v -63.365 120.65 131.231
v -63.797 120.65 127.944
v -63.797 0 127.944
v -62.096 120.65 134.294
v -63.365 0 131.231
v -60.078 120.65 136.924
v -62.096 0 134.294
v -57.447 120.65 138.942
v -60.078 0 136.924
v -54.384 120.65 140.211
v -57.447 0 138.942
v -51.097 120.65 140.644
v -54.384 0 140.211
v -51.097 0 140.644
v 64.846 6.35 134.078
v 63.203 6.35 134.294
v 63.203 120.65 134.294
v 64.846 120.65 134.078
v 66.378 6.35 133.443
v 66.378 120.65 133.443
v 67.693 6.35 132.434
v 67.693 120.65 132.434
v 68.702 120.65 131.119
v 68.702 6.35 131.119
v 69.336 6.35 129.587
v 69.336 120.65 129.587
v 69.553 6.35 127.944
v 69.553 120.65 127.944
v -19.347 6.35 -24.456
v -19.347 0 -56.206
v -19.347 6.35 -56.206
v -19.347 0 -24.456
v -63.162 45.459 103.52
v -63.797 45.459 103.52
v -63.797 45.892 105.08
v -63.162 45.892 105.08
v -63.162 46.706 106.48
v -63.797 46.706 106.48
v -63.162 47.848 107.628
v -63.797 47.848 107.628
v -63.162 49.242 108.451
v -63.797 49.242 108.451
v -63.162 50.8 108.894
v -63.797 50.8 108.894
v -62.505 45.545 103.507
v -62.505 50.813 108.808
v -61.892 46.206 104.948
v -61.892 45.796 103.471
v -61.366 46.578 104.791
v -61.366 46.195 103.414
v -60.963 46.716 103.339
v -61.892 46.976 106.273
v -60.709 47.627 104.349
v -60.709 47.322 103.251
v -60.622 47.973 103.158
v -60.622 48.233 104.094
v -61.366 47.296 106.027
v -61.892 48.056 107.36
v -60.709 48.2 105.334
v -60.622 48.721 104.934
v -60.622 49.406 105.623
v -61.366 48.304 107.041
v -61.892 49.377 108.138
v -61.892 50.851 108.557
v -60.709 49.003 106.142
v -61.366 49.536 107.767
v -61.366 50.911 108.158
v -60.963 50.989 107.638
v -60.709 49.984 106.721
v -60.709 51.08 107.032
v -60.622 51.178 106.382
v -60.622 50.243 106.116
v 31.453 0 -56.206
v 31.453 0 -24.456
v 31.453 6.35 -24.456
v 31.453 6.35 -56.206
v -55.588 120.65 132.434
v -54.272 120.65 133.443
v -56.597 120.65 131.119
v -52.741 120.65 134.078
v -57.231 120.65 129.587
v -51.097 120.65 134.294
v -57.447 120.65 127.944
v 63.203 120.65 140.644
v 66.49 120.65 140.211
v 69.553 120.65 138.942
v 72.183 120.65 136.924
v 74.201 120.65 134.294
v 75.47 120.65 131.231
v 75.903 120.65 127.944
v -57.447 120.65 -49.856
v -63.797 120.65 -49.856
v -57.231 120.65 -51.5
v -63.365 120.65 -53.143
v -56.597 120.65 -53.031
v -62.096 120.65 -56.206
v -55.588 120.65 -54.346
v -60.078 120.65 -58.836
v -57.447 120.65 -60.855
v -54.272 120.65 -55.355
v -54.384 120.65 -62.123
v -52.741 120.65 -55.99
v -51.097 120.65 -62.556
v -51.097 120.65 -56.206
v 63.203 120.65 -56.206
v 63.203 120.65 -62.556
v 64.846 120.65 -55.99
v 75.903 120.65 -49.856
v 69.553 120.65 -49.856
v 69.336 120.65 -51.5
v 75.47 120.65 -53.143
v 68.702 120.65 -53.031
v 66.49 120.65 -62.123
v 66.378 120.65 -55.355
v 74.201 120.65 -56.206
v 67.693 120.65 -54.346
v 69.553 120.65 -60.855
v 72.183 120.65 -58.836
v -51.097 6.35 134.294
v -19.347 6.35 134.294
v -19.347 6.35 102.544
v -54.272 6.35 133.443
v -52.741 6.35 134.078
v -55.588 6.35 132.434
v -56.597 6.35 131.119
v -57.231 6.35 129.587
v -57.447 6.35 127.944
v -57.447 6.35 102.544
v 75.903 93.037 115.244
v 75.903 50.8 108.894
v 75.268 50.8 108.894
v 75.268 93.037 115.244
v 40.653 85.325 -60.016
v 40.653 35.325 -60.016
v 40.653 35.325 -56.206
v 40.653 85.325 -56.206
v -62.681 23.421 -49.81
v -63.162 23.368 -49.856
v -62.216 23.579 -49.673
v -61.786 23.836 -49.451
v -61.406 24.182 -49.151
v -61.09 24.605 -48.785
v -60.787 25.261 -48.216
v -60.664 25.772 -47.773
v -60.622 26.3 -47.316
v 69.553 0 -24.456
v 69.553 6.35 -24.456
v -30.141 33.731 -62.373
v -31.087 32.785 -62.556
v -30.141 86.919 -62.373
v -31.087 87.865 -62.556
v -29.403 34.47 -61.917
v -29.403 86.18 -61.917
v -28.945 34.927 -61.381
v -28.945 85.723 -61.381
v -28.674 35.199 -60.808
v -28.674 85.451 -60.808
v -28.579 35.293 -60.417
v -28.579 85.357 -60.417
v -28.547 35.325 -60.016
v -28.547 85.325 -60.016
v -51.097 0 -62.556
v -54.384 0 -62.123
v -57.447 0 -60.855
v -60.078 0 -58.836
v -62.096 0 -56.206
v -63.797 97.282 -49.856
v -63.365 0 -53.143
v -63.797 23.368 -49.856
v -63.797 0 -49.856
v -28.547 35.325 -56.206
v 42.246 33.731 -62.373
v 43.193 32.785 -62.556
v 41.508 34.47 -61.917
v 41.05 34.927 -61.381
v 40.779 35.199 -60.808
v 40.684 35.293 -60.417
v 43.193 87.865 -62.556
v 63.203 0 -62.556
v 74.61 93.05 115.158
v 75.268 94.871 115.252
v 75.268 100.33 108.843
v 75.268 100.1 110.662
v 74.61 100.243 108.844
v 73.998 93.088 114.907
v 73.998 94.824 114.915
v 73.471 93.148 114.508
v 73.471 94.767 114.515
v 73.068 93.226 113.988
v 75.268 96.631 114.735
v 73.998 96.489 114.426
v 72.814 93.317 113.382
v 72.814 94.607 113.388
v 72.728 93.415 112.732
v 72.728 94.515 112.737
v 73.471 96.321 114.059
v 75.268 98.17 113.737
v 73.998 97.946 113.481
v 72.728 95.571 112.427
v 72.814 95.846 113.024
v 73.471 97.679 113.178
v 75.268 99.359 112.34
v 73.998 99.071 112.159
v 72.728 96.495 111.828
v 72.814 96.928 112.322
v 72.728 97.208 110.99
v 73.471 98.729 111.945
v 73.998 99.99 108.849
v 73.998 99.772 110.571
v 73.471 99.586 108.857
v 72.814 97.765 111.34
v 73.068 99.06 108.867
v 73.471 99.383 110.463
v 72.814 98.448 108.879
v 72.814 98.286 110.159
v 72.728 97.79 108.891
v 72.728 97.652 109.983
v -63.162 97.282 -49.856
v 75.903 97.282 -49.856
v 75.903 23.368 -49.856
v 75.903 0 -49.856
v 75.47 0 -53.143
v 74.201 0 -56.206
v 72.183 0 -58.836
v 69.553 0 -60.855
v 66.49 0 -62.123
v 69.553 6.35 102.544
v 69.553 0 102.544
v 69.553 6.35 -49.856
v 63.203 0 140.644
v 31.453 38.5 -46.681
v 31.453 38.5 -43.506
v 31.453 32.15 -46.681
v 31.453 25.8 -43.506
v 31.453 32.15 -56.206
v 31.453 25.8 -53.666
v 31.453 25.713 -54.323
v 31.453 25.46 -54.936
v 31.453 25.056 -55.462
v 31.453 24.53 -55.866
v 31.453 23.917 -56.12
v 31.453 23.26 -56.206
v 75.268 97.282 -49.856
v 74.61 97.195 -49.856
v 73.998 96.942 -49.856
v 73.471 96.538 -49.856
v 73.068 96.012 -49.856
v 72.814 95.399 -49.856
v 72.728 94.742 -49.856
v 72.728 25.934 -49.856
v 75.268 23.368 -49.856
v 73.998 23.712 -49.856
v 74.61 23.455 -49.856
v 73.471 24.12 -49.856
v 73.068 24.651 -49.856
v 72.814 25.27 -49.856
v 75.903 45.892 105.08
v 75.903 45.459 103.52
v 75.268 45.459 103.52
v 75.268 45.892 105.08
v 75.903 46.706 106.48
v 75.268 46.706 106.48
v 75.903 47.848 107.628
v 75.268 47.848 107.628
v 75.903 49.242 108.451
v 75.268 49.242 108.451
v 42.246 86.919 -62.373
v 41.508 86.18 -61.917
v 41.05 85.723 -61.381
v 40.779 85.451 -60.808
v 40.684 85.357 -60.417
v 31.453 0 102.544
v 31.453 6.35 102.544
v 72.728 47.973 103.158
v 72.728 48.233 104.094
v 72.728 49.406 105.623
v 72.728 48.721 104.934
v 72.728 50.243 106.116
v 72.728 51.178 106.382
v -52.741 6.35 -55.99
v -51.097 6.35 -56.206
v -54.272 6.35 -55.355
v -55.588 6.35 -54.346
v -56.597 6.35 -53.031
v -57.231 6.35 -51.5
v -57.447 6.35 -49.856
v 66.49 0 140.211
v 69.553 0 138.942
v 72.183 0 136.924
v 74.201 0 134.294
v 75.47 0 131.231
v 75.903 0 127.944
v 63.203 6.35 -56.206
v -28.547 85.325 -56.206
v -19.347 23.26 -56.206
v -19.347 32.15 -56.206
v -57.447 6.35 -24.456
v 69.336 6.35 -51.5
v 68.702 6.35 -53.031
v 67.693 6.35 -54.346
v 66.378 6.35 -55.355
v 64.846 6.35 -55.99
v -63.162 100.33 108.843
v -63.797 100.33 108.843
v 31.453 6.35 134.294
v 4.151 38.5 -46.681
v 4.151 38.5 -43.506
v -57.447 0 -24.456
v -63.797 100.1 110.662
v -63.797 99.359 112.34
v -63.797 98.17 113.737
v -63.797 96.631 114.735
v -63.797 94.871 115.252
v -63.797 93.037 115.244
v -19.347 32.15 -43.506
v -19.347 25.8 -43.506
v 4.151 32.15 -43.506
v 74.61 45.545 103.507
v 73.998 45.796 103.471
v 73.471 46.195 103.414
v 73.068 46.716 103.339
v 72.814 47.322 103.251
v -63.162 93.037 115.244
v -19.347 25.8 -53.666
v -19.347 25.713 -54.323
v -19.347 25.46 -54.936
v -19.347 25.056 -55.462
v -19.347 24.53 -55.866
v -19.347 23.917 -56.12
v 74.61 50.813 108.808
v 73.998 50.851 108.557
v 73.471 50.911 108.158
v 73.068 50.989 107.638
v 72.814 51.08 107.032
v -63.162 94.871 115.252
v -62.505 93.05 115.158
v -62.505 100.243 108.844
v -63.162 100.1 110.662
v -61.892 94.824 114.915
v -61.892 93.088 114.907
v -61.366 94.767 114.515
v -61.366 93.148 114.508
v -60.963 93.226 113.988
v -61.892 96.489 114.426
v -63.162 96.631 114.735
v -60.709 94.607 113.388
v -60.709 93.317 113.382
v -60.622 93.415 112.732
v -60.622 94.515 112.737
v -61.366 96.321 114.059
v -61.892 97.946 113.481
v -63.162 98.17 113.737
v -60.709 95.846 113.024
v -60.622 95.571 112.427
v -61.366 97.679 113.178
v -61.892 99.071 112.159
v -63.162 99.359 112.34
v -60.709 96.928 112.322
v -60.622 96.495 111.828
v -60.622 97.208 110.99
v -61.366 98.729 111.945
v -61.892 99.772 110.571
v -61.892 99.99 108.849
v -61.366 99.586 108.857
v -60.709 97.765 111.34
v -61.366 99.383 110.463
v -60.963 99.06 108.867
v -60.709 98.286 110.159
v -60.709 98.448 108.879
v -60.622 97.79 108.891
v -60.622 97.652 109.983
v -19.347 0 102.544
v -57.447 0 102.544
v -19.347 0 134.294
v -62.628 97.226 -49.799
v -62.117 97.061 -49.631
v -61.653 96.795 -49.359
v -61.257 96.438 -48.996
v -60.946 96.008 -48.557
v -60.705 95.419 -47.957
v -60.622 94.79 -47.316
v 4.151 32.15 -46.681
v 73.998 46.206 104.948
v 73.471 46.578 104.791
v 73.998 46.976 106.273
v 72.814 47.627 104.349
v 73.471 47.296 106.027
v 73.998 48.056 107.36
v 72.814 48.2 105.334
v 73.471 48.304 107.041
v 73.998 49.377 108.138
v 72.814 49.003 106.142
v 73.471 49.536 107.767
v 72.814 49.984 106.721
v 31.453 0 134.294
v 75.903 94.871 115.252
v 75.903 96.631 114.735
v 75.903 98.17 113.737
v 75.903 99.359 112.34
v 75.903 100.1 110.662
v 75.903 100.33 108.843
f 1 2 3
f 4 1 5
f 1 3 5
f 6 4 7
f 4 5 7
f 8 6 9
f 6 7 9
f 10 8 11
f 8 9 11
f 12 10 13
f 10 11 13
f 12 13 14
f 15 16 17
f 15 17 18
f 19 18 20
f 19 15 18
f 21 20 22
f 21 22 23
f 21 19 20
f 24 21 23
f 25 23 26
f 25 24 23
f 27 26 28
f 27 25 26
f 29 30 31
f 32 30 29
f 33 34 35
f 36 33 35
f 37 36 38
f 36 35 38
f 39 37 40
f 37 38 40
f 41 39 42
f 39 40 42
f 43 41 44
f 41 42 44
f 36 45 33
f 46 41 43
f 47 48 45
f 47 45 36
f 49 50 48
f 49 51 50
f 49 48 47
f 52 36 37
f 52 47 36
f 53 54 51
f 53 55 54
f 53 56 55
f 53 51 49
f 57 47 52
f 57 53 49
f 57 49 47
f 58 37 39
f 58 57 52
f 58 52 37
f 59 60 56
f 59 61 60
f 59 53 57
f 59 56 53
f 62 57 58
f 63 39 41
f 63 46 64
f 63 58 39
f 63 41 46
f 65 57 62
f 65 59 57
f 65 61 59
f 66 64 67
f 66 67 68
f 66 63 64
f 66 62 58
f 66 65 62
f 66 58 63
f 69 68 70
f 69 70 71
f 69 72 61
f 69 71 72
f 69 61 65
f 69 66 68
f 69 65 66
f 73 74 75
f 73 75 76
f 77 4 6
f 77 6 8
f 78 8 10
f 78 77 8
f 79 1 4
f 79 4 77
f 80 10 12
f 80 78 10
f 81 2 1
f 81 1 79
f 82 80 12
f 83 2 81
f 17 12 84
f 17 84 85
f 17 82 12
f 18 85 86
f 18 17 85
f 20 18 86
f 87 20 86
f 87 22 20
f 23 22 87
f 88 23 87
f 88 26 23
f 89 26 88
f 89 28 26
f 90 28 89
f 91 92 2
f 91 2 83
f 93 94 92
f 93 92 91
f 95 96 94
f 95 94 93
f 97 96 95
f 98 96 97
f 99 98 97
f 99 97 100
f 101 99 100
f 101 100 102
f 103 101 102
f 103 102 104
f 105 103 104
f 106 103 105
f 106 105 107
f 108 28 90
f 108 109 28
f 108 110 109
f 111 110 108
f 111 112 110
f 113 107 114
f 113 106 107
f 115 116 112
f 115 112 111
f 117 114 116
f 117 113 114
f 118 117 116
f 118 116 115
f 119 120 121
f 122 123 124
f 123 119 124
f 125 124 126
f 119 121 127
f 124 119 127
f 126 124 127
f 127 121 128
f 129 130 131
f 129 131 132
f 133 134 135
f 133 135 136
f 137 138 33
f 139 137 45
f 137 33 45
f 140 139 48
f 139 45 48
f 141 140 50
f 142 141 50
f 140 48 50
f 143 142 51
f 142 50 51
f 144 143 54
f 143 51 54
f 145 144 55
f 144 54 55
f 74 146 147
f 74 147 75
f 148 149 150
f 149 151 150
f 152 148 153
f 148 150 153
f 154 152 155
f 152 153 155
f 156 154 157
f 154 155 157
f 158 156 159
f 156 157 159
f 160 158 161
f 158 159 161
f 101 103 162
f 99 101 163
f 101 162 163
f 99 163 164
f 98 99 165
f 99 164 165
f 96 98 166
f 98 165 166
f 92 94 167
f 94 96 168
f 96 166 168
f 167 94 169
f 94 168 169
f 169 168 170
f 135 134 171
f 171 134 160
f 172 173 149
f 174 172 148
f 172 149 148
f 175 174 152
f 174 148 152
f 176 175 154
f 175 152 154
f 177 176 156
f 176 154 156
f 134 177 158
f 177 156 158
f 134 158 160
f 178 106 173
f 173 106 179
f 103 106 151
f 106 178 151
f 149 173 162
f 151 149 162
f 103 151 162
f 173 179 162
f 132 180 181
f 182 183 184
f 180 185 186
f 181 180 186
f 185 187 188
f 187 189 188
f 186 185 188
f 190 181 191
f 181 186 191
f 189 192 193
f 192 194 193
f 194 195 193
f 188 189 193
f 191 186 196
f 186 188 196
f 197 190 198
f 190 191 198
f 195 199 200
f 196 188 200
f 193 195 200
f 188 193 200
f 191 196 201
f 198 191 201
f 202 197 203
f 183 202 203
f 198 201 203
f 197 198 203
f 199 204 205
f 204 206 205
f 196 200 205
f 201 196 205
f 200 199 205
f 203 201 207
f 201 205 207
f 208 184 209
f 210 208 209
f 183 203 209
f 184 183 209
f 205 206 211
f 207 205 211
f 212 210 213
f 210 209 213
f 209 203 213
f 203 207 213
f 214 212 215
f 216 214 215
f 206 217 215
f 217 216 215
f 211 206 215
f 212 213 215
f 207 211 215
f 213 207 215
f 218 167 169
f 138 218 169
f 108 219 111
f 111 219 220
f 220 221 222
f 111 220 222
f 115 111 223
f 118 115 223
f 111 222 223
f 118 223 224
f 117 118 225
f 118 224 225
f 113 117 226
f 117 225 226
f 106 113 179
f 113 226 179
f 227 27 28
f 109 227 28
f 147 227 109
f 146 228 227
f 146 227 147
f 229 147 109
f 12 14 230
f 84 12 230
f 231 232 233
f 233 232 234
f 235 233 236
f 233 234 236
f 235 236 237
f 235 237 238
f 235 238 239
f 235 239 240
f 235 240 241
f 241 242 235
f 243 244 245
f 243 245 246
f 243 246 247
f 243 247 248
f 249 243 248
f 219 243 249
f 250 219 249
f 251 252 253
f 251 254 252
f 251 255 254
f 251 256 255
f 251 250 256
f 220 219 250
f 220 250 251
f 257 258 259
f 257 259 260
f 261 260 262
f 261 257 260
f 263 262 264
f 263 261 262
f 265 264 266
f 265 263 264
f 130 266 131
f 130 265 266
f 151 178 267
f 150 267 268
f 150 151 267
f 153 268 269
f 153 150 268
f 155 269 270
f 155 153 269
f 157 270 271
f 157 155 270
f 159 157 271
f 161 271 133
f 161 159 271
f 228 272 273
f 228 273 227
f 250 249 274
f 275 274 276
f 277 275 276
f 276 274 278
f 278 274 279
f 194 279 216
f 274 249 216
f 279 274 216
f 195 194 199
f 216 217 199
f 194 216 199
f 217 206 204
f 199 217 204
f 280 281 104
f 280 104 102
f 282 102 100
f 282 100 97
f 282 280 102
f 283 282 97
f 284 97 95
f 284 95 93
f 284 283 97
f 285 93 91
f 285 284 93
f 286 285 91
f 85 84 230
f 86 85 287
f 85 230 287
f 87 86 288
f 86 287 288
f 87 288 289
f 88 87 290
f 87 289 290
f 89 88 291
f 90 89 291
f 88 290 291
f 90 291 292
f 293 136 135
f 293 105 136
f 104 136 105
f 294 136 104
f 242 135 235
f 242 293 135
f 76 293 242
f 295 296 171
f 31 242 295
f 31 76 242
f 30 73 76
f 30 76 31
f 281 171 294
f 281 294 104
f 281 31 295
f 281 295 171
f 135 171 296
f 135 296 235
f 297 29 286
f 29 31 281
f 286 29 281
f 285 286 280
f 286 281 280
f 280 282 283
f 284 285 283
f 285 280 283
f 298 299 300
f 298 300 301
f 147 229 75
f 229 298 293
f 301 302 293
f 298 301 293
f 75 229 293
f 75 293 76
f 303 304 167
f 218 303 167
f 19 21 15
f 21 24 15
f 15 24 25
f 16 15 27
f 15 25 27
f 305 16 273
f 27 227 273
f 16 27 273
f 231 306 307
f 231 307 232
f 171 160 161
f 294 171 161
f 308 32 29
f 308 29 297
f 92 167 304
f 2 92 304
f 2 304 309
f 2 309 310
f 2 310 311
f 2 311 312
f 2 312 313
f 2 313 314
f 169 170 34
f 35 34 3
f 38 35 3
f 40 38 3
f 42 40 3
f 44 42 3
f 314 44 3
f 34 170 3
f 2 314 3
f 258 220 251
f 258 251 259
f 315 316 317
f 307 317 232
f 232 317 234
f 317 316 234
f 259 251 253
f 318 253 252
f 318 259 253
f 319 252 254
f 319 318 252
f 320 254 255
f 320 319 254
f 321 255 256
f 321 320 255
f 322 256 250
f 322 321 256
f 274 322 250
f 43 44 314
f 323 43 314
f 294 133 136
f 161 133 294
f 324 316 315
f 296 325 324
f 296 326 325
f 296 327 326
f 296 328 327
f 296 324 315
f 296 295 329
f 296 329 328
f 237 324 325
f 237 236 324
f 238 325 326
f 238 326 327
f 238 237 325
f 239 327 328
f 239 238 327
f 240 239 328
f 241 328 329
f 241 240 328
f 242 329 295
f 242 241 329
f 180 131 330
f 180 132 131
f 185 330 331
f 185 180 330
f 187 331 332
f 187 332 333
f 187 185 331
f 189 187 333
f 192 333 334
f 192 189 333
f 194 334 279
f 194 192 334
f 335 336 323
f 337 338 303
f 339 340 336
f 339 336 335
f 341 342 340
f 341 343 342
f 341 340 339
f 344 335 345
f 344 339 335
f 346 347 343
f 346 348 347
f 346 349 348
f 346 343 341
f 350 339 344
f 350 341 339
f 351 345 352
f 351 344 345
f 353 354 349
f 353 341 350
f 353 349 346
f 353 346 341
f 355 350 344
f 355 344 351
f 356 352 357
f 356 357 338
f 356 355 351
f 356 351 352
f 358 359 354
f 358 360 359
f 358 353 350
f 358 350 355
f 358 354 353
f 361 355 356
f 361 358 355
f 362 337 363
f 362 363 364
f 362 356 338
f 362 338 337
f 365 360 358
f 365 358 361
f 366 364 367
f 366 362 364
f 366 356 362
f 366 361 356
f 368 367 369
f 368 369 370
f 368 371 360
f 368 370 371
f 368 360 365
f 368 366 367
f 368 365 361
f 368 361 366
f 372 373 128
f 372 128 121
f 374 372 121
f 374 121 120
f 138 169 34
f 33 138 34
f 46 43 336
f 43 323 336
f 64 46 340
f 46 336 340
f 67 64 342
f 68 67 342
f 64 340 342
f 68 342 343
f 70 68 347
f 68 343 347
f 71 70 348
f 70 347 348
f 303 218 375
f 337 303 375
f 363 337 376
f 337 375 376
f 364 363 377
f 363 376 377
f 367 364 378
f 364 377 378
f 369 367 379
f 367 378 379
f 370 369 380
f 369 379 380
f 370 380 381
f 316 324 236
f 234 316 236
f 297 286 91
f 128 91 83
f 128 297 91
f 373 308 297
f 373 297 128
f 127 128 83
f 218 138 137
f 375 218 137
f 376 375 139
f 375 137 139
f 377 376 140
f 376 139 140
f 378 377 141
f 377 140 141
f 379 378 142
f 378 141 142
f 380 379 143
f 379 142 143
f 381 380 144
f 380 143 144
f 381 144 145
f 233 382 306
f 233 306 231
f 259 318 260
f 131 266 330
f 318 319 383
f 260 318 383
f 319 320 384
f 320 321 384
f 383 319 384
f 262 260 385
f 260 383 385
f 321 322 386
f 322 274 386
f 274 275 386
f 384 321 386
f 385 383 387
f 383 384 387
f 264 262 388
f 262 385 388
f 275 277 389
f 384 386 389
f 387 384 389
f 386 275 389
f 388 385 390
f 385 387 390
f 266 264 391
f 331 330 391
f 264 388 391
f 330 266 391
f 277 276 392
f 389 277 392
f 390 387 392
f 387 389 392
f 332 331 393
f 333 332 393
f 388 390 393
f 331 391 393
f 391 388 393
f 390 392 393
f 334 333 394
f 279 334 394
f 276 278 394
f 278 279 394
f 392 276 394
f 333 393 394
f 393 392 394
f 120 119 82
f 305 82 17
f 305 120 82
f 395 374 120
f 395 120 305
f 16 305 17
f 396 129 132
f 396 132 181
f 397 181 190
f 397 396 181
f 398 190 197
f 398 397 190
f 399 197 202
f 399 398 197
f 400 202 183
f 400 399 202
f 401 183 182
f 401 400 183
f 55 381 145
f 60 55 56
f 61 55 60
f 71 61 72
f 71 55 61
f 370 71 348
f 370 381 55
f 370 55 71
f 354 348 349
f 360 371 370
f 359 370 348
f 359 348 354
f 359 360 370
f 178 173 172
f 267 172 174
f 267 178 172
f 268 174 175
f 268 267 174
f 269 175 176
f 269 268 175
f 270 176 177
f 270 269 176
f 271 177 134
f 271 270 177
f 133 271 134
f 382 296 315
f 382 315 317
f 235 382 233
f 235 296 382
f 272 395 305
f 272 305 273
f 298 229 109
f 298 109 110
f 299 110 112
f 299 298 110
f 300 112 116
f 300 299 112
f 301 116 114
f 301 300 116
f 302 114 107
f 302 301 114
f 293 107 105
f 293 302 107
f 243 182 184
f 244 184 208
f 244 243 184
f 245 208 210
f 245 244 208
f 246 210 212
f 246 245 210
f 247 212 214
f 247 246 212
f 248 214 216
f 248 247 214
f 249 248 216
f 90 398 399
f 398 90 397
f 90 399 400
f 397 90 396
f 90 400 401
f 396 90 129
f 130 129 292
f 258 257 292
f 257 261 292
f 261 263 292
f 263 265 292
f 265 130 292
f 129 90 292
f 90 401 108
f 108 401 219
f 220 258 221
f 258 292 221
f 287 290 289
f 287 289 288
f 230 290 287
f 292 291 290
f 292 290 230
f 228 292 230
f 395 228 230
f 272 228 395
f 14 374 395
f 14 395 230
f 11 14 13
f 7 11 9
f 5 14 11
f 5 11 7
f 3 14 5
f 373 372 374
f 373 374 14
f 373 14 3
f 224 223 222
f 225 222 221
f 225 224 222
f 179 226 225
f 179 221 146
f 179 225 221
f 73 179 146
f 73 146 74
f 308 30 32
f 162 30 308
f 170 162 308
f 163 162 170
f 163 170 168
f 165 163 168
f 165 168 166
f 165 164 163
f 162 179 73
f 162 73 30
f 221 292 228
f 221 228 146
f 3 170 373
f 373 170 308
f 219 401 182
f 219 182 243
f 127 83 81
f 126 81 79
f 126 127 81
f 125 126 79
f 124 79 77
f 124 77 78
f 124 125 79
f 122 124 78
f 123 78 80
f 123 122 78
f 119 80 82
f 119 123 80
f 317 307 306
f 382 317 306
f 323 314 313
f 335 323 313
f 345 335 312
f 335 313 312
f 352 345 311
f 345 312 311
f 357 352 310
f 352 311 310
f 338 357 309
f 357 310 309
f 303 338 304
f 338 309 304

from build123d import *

# Parameters (mm, degrees)
BOSS_EXTRUDE1_DEPTH = 6.35
BOSS_EXTRUDE2_DEPTH = 114.3
SKETCH3_W           = 69.2
SKETCH3_H           = 50
CUT_EXTRUDE1_DEPTH  = 31.71
FILLET1_R           = 2.54
CUT_EXTRUDE2_DEPTH  = 3.175
FILLET2_R           = 2.54
SKETCH8_W           = 50.8
SKETCH8_H           = 6.35
BOSS_EXTRUDE3_DEPTH = 12.7
SKETCH9_W           = 27.302002056
SKETCH9_H           = 3.175
BOSS_EXTRUDE4_DEPTH = 6.35
FILLET4_R           = 2.54
FILLET5_R           = 2.54


with BuildPart() as part:
    # Sketch1 → Boss-Extrude1 (new body)
    with BuildSketch(Plane(origin=(0, 0, 0), x_dir=(1, 0, 0), z_dir=(0, 1, 0))):
        with BuildLine():
            Line((-51.097477477, 62.55608588), (63.202522523, 62.55608588))
            ThreePointArc((63.202522523, 62.55608588), (72.182778644, 58.836342002), (75.902522523, 49.85608588))
            Line((75.902522523, 49.85608588), (75.902522523, -127.94391412))
            ThreePointArc((75.902522523, -127.94391412), (72.182778644, -136.924170241), (63.202522523, -140.64391412))
            Line((63.202522523, -140.64391412), (-51.097477477, -140.64391412))
            ThreePointArc((-51.097477477, -140.64391412), (-60.077733599, -136.924170241), (-63.797477477, -127.94391412))
            Line((-63.797477477, -127.94391412), (-63.797477477, 49.85608588))
            ThreePointArc((-63.797477477, 49.85608588), (-60.077733599, 58.836342002), (-51.097477477, 62.55608588))
        make_face()
        Polygon((-57.447477477, 24.45608588), (-57.447477477, -102.54391412), (-19.347477477, -102.54391412), (-19.347477477, -134.29391412), (31.452522523, -134.29391412), (31.452522523, -102.54391412), (69.552522523, -102.54391412), (69.552522523, 24.45608588), (31.452522523, 24.45608588), (31.452522523, 56.20608588), (-19.347477477, 56.20608588), (-19.347477477, 24.45608588), align=None, mode=Mode.SUBTRACT)
    extrude(amount=BOSS_EXTRUDE1_DEPTH)

    # Sketch2 → Boss-Extrude2 (add)
    with BuildSketch(Plane(origin=(0, 6.35, 0), x_dir=(1, 0, 0), z_dir=(0, 1, 0))):
        with BuildLine():
            Line((75.902522523, -127.94391412), (75.902522523, 49.85608588))
            ThreePointArc((75.902522523, 49.85608588), (72.182778644, 58.836342002), (63.202522523, 62.55608588))
            Line((63.202522523, 62.55608588), (-51.097477477, 62.55608588))
            ThreePointArc((-51.097477477, 62.55608588), (-60.077733599, 58.836342002), (-63.797477477, 49.85608588))
            Line((-63.797477477, 49.85608588), (-63.797477477, -127.94391412))
            ThreePointArc((-63.797477477, -127.94391412), (-60.077733599, -136.924170241), (-51.097477477, -140.64391412))
            Line((-51.097477477, -140.64391412), (63.202522523, -140.64391412))
            ThreePointArc((63.202522523, -140.64391412), (72.182778644, -136.924170241), (75.902522523, -127.94391412))
        make_face()
        with BuildLine():
            Line((69.552522523, -127.94391412), (69.552522523, 49.85608588))
            ThreePointArc((69.552522523, 49.85608588), (67.692650583, 54.346213941), (63.202522523, 56.20608588))
            Line((63.202522523, 56.20608588), (-51.097477477, 56.20608588))
            ThreePointArc((-51.097477477, 56.20608588), (-55.587605538, 54.346213941), (-57.447477477, 49.85608588))
            Line((-57.447477477, 49.85608588), (-57.447477477, -127.94391412))
            ThreePointArc((-57.447477477, -127.94391412), (-55.587605538, -132.43404218), (-51.097477477, -134.29391412))
            Line((-51.097477477, -134.29391412), (63.202522523, -134.29391412))
            ThreePointArc((63.202522523, -134.29391412), (67.692650583, -132.43404218), (69.552522523, -127.94391412))
        make_face(mode=Mode.SUBTRACT)
    extrude(amount=BOSS_EXTRUDE2_DEPTH)

    # Sketch3 → Cut-Extrude1 (cut)
    with BuildSketch(Plane(origin=(0, 0, -62.55608588), x_dir=(-1, 0, 0), z_dir=(0, 0, -1))):
        with Locations((-6.052522523, 60.325)):
            Rectangle(SKETCH3_W, SKETCH3_H)
    extrude(amount=-CUT_EXTRUDE1_DEPTH, mode=Mode.SUBTRACT)

    # Fillet1
    fillet1_edges = [part.edges().sort_by_distance(p)[0] for p in [
        (6.052522523, 85.325, -62.55608588),
        (-28.547477477, 60.325, -62.55608588),
        (40.652522523, 60.325, -62.55608588),
        (6.052522523, 35.325, -62.55608588),
    ]]
    fillet(fillet1_edges, radius=FILLET1_R)

    # Sketch6 → Cut-Extrude2 (cut)
    with BuildSketch(Plane.ZY.offset(63.797477477)):
        with BuildLine():
            Line((-49.85608588, 23.368), (103.519740541, 45.45891847))
            ThreePointArc((103.519740541, 45.45891847), (107.09072322, 47.24008694), (108.89391412, 50.8))
            Line((108.89391412, 50.8), (115.24391412, 93.037110429))
            ThreePointArc((115.24391412, 93.037110429), (113.736824756, 98.170115624), (108.842546446, 100.33))
            Line((108.842546446, 100.33), (-49.85608588, 97.282))
            Line((-49.85608588, 97.282), (-49.85608588, 23.368))
        make_face()
    cut_extrude2 = extrude(amount=-CUT_EXTRUDE2_DEPTH, mode=Mode.SUBTRACT)

    # Fillet2
    fillet2_edges = [part.edges().sort_by_distance(p)[0] for p in [
        (-60.622477477, 98.170115624, 113.736824756),
        (-60.622477477, 71.918555214, 112.06891412),
        (-60.622477477, 47.24008694, 107.09072322),
        (-60.622477477, 34.413459235, 26.83182733),
        (-60.622477477, 60.325, -49.85608588),
        (-60.622477477, 98.806, 29.493230283),
    ]]
    fillet(fillet2_edges, radius=FILLET2_R)

    # Sketch8 → Boss-Extrude3 (add)
    with BuildSketch(Plane.XY.offset(-56.20608588)):
        with Locations((6.052522523, 28.975)):
            Rectangle(SKETCH8_W, SKETCH8_H)
    extrude(amount=BOSS_EXTRUDE3_DEPTH)

    # Sketch9 → Boss-Extrude4 (add)
    with BuildSketch(Plane(origin=(0, 32.15, 0), x_dir=(1, 0, 0), z_dir=(0, 1, 0))):
        with Locations((17.801521495, 45.09358588)):
            Rectangle(SKETCH9_W, SKETCH9_H)
    extrude(amount=BOSS_EXTRUDE4_DEPTH)

    # Fillet4
    fillet4_edges = [part.edges().sort_by_distance(p)[0] for p in [
        (6.052522523, 25.8, -56.20608588),
    ]]
    fillet(fillet4_edges, radius=FILLET4_R)

    # Mirror2: Cut-Extrude2 across plane
    add(cut_extrude2.mirror(Plane(origin=(6.052522523, 0, 0), x_dir=(0, 0, 1), z_dir=(1, 0, 0))), mode=Mode.SUBTRACT)

    # Fillet5
    fillet5_edges = [part.edges().sort_by_distance(p)[0] for p in [
        (72.727522523, 98.170115624, 113.736824756),
        (72.727522523, 98.806, 29.493230283),
        (72.727522523, 34.413459235, 26.83182733),
        (72.727522523, 47.24008694, 107.09072322),
        (72.727522523, 71.918555214, 112.06891412),
    ]]
    fillet(fillet5_edges, radius=FILLET5_R)


solid = part.part
